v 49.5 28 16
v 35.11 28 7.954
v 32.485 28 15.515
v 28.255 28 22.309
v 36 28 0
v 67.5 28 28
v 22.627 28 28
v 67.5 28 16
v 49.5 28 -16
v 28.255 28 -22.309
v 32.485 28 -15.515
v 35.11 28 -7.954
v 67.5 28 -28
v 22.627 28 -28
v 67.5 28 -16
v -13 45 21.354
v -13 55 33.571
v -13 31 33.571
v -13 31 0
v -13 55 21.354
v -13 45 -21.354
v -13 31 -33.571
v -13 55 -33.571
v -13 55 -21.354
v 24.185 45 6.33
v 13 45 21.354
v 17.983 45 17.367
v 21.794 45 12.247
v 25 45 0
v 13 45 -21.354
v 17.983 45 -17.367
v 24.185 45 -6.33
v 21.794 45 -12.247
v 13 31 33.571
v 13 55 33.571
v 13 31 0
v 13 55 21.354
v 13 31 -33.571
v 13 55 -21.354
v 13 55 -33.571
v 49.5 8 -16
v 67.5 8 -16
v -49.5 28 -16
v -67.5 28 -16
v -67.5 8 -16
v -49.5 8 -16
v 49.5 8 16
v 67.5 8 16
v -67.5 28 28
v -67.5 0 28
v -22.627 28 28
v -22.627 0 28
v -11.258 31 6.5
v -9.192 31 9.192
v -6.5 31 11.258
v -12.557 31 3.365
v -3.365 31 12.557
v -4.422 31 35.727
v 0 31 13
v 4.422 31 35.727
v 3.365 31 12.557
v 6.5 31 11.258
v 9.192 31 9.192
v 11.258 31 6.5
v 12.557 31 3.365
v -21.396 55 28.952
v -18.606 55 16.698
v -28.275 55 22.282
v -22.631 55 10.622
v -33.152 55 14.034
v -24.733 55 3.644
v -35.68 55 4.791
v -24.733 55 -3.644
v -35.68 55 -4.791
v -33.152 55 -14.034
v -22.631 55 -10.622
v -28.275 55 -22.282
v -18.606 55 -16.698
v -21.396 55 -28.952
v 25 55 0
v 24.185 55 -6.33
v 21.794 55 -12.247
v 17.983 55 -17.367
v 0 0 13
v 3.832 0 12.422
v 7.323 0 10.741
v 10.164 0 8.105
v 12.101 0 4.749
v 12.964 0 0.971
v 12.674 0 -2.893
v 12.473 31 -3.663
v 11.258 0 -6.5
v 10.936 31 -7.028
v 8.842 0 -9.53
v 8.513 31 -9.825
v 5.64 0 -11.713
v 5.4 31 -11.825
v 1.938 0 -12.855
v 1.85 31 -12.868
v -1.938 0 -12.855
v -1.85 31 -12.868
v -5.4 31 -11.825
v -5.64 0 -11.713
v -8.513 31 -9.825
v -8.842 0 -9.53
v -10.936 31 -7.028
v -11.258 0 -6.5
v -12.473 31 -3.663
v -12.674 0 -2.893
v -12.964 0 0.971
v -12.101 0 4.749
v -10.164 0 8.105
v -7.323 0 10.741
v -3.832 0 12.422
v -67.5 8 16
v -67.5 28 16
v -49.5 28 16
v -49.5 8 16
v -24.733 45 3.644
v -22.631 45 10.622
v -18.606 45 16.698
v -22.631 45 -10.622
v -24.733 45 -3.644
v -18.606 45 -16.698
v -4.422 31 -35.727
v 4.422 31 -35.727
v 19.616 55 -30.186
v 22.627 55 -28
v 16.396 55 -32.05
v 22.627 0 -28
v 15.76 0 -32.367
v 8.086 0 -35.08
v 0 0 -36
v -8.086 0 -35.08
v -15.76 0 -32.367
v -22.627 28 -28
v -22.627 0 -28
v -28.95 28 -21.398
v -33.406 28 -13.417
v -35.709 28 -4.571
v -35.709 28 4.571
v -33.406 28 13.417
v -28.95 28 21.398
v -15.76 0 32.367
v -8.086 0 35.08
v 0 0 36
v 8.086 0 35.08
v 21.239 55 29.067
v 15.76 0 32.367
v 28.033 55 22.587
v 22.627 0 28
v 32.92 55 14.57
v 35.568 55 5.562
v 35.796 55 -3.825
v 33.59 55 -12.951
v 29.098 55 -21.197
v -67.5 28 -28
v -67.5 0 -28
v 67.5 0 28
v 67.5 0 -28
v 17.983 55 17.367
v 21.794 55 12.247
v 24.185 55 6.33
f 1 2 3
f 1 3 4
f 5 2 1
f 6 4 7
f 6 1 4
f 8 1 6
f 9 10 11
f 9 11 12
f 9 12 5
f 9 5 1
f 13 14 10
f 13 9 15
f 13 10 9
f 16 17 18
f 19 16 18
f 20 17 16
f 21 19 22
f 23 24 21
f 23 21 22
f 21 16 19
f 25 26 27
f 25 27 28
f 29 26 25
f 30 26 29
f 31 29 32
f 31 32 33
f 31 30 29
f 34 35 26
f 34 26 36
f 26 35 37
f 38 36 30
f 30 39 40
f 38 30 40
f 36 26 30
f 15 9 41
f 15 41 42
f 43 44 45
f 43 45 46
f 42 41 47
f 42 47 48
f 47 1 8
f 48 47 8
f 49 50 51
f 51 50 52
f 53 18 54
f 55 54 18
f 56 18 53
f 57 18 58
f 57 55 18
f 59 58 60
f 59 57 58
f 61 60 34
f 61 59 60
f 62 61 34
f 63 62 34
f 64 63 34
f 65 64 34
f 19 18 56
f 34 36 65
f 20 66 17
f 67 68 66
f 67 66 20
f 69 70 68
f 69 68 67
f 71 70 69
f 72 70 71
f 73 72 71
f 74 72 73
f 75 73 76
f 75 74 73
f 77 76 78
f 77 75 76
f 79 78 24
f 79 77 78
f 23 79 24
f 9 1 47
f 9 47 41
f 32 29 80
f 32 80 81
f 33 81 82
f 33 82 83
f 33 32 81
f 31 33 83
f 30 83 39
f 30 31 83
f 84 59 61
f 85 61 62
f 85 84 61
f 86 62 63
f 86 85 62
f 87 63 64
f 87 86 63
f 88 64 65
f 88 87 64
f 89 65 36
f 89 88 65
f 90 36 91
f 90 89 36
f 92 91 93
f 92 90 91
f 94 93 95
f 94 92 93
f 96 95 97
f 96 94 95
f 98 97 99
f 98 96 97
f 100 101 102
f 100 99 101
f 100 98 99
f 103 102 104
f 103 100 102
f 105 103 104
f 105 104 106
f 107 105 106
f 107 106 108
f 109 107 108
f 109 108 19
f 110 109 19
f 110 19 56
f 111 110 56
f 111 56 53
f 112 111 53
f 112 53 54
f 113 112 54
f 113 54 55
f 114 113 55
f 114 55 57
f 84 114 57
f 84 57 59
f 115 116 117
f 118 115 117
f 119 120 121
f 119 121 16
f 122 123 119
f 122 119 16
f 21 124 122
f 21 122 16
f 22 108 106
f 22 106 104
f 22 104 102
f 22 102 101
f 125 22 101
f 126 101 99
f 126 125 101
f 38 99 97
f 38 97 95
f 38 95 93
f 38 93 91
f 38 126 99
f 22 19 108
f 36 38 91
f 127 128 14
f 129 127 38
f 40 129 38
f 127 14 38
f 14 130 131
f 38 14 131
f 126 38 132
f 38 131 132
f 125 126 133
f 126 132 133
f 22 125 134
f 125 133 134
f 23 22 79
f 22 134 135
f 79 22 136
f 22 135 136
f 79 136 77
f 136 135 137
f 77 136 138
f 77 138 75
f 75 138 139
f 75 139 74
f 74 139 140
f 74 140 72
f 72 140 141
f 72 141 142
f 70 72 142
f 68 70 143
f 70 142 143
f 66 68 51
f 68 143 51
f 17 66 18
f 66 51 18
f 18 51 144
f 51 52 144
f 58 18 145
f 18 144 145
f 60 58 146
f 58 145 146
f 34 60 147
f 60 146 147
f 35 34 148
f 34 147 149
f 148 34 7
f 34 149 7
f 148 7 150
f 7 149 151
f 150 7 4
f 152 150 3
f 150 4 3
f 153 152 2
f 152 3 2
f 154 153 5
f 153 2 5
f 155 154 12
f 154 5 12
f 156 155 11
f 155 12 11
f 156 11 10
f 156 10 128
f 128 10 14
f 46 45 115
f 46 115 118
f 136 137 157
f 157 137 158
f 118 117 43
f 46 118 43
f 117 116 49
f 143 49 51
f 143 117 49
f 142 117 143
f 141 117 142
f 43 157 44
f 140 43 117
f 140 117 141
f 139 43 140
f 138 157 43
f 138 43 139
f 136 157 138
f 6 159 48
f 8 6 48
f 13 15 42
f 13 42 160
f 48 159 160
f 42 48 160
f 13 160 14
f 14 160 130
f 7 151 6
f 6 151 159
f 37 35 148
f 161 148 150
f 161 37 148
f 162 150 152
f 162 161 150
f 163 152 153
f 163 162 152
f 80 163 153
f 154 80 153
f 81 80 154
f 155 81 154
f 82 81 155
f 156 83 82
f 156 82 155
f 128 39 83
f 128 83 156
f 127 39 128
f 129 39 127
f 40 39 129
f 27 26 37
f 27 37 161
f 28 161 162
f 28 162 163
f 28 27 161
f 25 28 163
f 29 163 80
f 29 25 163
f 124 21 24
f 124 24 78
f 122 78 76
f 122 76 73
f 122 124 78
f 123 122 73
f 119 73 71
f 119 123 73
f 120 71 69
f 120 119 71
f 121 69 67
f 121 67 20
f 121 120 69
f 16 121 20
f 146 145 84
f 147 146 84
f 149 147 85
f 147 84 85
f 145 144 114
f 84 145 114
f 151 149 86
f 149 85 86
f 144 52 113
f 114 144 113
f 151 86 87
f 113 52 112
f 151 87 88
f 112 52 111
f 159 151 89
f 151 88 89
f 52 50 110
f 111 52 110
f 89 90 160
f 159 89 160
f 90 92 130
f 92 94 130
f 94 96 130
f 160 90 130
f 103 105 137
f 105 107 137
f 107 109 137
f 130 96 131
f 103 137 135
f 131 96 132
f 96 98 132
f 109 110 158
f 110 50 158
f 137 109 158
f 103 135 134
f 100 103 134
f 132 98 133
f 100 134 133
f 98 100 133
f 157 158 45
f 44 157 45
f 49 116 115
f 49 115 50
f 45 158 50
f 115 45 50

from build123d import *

# Parameters (mm, degrees)
BOSS_EXTRUDE1_DEPTH   = 28
BOSS_EXTRUDE1_2_DEPTH = 28
SKETCH1_4_R           = 36
BOSS_EXTRUDE2_DEPTH   = 55
SKETCH1_5_R           = 13
CUT_EXTRUDE1_DEPTH    = 95.21915941
CUT_EXTRUDE2_START    = -10
SKETCH2_R             = 25
SKETCH2_R_2           = 13
CUT_EXTRUDE2_DEPTH    = 10
SKETCH2_3_W           = 26
SKETCH2_3_H           = 91.506160118
CUT_EXTRUDE3_DEPTH    = 24
SKETCH3_W             = 36
SKETCH3_H             = 32
CUT_EXTRUDE4_DEPTH    = 20


with BuildPart() as part:
    # Sketch1 → Boss-Extrude1 (new body)
    with BuildSketch(Plane(origin=(0, 0, 0), x_dir=(1, 0, 0), z_dir=(0, 1, 0))):
        with BuildLine():
            Line((-67.5, 28), (-67.5, -28))
            Line((-67.5, -28), (-22.627416998, -28))
            ThreePointArc((-22.627416998, -28), (-36, 0), (-22.627416998, 28))
            Line((-22.627416998, 28), (-67.5, 28))
        make_face()
    extrude(amount=BOSS_EXTRUDE1_DEPTH)



with BuildPart() as body_2:
    # Sketch1 → Boss-Extrude1 2 (new body)
    with BuildSketch(Plane(origin=(0, 0, 0), x_dir=(1, 0, 0), z_dir=(0, 1, 0))):
        with BuildLine():
            ThreePointArc((22.627416998, 28), (36, 0), (22.627416998, -28))
            Line((22.627416998, -28), (67.5, -28))
            Line((67.5, -28), (67.5, 28))
            Line((67.5, 28), (22.627416998, 28))
        make_face()
    extrude(amount=BOSS_EXTRUDE1_2_DEPTH)


with BuildPart() as part_1:
    add(part.part)

    add(body_2.part)  # Boss-Extrude2 merges body 2
    # Sketch1<4> → Boss-Extrude2 (add)
    with BuildSketch(Plane(origin=(0, 0, 0), x_dir=(1, 0, 0), z_dir=(0, 1, 0))):
        Circle(SKETCH1_4_R)
    extrude(amount=BOSS_EXTRUDE2_DEPTH)

    # Sketch1<5> → Cut-Extrude1 (cut, through all)
    with BuildSketch(Plane(origin=(0, 0, 0), x_dir=(1, 0, 0), z_dir=(0, 1, 0))):
        Circle(SKETCH1_5_R)
    extrude(amount=CUT_EXTRUDE1_DEPTH, mode=Mode.SUBTRACT)

    # Sketch2 → Cut-Extrude2 (cut)
    with BuildSketch(Plane(origin=(0, 55, 0), x_dir=(1, 0, 0), z_dir=(0, 1, 0)).offset(CUT_EXTRUDE2_START)):
        Circle(SKETCH2_R)
        Circle(SKETCH2_R_2, mode=Mode.SUBTRACT)
    extrude(amount=CUT_EXTRUDE2_DEPTH, mode=Mode.SUBTRACT)

    # Sketch2<3> → Cut-Extrude3 (cut)
    with BuildSketch(Plane(origin=(0, 55, 0), x_dir=(1, 0, 0), z_dir=(0, 1, 0))):
        Rectangle(SKETCH2_3_W, SKETCH2_3_H)
    extrude(amount=-CUT_EXTRUDE3_DEPTH, mode=Mode.SUBTRACT)

    # Sketch3 → Cut-Extrude4 (cut)
    with BuildSketch(Plane(origin=(0, 28, 0), x_dir=(1, 0, 0), z_dir=(0, 1, 0))):
        with Locations((67.5, 0)):
            Rectangle(SKETCH3_W, SKETCH3_H)
        with Locations((-67.5, 0)):
            Rectangle(SKETCH3_W, SKETCH3_H)
    extrude(amount=-CUT_EXTRUDE4_DEPTH, mode=Mode.SUBTRACT)


solid = part_1.part
